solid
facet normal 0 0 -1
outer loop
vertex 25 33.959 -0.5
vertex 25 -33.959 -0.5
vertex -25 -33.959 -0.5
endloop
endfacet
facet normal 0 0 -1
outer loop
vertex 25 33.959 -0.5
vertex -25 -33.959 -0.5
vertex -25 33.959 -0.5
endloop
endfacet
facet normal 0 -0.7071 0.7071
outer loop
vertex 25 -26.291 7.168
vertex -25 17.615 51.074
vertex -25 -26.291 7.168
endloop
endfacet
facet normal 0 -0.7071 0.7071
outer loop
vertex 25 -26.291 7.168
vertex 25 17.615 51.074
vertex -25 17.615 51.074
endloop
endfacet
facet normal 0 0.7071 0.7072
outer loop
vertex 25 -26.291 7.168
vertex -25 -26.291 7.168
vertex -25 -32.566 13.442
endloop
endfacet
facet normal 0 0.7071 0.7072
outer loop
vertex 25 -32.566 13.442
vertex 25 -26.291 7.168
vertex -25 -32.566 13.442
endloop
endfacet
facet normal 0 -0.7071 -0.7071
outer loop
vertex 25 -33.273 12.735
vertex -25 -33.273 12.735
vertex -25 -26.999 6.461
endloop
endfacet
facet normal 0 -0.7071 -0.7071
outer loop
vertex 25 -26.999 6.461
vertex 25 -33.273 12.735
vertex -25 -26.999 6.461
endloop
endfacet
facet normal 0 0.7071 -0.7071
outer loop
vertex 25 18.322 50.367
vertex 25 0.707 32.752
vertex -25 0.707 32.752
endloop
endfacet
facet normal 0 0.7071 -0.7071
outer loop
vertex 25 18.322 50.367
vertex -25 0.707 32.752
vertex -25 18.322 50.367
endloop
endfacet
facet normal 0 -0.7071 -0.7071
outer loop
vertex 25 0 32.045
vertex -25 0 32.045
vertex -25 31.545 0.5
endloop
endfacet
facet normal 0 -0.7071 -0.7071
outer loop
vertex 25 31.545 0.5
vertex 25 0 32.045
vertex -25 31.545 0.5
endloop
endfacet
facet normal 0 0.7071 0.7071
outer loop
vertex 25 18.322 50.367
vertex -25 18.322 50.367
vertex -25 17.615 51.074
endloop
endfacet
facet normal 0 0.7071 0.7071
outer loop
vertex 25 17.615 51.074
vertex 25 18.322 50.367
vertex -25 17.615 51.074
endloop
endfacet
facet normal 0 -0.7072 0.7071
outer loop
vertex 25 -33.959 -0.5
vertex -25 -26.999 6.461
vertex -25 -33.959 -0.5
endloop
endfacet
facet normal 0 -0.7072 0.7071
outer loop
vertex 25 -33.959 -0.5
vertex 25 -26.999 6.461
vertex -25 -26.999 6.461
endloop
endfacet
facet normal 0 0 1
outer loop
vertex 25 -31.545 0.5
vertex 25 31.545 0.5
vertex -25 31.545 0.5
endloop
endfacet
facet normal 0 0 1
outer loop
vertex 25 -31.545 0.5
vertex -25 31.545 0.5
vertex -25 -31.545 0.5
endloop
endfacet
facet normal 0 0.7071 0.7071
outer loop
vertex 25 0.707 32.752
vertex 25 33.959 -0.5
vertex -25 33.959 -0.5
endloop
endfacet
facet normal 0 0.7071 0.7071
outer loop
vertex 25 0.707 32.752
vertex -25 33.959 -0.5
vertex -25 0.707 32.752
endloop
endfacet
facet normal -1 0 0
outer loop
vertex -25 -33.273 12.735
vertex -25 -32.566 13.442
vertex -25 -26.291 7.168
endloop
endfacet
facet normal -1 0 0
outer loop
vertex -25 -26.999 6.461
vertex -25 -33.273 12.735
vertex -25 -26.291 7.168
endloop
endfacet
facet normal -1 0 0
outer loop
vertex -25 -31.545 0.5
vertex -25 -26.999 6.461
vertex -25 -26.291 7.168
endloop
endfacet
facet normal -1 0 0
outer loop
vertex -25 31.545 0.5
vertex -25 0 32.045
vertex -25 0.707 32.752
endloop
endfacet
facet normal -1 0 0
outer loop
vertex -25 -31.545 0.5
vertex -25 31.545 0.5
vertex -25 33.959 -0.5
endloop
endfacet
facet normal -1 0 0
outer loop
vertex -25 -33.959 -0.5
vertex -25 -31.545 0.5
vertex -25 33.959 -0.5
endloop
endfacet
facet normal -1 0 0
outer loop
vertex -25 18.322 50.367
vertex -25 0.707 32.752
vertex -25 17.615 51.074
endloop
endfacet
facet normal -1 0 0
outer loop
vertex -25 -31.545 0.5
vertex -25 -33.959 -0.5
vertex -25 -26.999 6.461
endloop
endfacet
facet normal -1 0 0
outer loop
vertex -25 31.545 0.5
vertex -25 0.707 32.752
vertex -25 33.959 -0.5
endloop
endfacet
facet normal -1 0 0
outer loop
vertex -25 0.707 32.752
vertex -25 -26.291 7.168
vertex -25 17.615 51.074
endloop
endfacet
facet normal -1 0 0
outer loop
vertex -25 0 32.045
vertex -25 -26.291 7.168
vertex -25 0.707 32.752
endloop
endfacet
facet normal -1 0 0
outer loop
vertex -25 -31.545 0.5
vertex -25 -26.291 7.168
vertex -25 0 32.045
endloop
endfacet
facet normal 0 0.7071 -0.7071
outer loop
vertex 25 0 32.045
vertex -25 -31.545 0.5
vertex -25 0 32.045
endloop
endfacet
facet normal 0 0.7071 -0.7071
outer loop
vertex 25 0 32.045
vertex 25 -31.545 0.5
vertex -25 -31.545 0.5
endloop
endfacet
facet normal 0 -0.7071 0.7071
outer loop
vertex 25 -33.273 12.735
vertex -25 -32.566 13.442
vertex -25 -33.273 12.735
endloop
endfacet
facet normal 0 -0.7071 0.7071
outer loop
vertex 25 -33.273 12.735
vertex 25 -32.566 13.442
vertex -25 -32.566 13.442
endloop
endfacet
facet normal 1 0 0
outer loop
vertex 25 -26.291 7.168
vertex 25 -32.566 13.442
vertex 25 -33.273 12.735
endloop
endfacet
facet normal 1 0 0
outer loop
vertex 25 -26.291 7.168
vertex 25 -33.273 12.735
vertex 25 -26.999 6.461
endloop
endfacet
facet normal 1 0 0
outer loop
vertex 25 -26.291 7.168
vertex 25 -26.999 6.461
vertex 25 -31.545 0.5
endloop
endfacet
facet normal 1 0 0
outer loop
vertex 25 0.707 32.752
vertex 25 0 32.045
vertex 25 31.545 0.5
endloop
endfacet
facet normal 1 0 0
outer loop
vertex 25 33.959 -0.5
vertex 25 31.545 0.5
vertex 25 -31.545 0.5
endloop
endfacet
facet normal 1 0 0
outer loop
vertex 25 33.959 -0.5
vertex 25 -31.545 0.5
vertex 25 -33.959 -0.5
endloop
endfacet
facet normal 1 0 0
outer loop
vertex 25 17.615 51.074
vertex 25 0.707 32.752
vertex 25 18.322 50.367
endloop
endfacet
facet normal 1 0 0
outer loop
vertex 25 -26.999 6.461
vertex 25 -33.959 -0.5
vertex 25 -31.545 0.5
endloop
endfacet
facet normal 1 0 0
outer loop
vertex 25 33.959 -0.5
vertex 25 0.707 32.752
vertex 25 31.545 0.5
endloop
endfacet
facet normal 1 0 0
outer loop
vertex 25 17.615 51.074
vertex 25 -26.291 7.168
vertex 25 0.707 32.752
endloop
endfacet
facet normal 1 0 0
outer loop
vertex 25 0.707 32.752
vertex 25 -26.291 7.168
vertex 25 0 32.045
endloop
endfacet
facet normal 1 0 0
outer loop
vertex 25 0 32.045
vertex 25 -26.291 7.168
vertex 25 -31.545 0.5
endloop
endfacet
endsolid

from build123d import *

# Parameters (mm, degrees)
F1_DEPTH = 25


with BuildPart() as f1:
    # F0 (on Right) → F1 (new body, symmetric)
    with BuildSketch(Plane.YZ):
        Polygon((-26.998525, 6.460627), (-33.959152, -0.5), (33.959152, -0.5), (0.707107, 32.752045), (18.321796, 50.366735), (17.61469, 51.073841), (-26.291418, 7.167734), (-32.56589, 13.442206), (-33.272997, 12.735099), align=None)
        Polygon((31.544938, 0.5), (-31.544938, 0.5), (0, 32.044938), align=None, mode=Mode.SUBTRACT)
    extrude(amount=F1_DEPTH, both=True)


solid = f1.part
